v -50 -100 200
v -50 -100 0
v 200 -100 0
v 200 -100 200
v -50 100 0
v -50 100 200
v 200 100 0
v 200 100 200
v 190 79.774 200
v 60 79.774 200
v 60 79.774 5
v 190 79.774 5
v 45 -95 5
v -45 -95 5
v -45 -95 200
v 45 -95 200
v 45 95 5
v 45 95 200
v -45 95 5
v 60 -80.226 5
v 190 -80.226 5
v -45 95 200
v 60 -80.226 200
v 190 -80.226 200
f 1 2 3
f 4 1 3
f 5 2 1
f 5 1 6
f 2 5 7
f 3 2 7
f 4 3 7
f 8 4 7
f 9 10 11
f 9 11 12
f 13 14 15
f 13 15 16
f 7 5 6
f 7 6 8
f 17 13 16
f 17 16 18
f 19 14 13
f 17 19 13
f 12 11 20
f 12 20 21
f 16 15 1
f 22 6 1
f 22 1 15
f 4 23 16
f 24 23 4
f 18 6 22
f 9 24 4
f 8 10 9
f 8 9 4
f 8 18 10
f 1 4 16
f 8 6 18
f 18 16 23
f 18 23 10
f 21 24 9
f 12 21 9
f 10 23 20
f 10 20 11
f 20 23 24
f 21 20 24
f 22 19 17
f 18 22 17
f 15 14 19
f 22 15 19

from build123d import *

# Parameters (mm, degrees)
F0_W     = 100
F0_H     = 200
F1_DEPTH = 200
F0_W_2   = 150
F2_DEPTH = 200
F3_W     = 90
F3_H     = 190
F4_DEPTH = 195
F5_W     = 100
F5_H     = 130
F7_DEPTH = 195
F6_W     = 130
F6_H     = 160
F6_W_2   = 100
F6_H_2   = 130
F8_DEPTH = 195


with BuildPart() as f1:
    # F0 (on Top) → F1 (new body)
    with BuildSketch(Plane.XY):
        Rectangle(F0_W, F0_H)
    extrude(amount=F1_DEPTH)

    # F0 (on Top) → F2 (join)
    with BuildSketch(Plane.XY):
        with Locations((125, 0)):
            Rectangle(F0_W_2, F0_H)
    extrude(amount=F2_DEPTH)

    # F3 (on face) → F4 (cut)
    with BuildSketch(Plane.XY.offset(200)):
        Rectangle(F3_W, F3_H)
    extrude(amount=-F4_DEPTH, mode=Mode.SUBTRACT)

    # F5 (on face) → F7 (cut)
    with BuildSketch(Plane.XY.offset(200)):
        with Locations((125, -0.22641)):
            Rectangle(F5_W, F5_H)
    extrude(amount=-F7_DEPTH, mode=Mode.SUBTRACT)

    # F6 (on face) → F8 (cut)
    with BuildSketch(Plane.XY.offset(200)):
        with Locations((125, -0.22641)):
            Rectangle(F6_W, F6_H)
        with Locations((125, -0.22641)):
            Rectangle(F6_W, F6_H)
        with Locations((125, -0.22641)):
            Rectangle(F6_W_2, F6_H_2, mode=Mode.SUBTRACT)
    extrude(amount=-F8_DEPTH, mode=Mode.SUBTRACT)


solid = f1.part
